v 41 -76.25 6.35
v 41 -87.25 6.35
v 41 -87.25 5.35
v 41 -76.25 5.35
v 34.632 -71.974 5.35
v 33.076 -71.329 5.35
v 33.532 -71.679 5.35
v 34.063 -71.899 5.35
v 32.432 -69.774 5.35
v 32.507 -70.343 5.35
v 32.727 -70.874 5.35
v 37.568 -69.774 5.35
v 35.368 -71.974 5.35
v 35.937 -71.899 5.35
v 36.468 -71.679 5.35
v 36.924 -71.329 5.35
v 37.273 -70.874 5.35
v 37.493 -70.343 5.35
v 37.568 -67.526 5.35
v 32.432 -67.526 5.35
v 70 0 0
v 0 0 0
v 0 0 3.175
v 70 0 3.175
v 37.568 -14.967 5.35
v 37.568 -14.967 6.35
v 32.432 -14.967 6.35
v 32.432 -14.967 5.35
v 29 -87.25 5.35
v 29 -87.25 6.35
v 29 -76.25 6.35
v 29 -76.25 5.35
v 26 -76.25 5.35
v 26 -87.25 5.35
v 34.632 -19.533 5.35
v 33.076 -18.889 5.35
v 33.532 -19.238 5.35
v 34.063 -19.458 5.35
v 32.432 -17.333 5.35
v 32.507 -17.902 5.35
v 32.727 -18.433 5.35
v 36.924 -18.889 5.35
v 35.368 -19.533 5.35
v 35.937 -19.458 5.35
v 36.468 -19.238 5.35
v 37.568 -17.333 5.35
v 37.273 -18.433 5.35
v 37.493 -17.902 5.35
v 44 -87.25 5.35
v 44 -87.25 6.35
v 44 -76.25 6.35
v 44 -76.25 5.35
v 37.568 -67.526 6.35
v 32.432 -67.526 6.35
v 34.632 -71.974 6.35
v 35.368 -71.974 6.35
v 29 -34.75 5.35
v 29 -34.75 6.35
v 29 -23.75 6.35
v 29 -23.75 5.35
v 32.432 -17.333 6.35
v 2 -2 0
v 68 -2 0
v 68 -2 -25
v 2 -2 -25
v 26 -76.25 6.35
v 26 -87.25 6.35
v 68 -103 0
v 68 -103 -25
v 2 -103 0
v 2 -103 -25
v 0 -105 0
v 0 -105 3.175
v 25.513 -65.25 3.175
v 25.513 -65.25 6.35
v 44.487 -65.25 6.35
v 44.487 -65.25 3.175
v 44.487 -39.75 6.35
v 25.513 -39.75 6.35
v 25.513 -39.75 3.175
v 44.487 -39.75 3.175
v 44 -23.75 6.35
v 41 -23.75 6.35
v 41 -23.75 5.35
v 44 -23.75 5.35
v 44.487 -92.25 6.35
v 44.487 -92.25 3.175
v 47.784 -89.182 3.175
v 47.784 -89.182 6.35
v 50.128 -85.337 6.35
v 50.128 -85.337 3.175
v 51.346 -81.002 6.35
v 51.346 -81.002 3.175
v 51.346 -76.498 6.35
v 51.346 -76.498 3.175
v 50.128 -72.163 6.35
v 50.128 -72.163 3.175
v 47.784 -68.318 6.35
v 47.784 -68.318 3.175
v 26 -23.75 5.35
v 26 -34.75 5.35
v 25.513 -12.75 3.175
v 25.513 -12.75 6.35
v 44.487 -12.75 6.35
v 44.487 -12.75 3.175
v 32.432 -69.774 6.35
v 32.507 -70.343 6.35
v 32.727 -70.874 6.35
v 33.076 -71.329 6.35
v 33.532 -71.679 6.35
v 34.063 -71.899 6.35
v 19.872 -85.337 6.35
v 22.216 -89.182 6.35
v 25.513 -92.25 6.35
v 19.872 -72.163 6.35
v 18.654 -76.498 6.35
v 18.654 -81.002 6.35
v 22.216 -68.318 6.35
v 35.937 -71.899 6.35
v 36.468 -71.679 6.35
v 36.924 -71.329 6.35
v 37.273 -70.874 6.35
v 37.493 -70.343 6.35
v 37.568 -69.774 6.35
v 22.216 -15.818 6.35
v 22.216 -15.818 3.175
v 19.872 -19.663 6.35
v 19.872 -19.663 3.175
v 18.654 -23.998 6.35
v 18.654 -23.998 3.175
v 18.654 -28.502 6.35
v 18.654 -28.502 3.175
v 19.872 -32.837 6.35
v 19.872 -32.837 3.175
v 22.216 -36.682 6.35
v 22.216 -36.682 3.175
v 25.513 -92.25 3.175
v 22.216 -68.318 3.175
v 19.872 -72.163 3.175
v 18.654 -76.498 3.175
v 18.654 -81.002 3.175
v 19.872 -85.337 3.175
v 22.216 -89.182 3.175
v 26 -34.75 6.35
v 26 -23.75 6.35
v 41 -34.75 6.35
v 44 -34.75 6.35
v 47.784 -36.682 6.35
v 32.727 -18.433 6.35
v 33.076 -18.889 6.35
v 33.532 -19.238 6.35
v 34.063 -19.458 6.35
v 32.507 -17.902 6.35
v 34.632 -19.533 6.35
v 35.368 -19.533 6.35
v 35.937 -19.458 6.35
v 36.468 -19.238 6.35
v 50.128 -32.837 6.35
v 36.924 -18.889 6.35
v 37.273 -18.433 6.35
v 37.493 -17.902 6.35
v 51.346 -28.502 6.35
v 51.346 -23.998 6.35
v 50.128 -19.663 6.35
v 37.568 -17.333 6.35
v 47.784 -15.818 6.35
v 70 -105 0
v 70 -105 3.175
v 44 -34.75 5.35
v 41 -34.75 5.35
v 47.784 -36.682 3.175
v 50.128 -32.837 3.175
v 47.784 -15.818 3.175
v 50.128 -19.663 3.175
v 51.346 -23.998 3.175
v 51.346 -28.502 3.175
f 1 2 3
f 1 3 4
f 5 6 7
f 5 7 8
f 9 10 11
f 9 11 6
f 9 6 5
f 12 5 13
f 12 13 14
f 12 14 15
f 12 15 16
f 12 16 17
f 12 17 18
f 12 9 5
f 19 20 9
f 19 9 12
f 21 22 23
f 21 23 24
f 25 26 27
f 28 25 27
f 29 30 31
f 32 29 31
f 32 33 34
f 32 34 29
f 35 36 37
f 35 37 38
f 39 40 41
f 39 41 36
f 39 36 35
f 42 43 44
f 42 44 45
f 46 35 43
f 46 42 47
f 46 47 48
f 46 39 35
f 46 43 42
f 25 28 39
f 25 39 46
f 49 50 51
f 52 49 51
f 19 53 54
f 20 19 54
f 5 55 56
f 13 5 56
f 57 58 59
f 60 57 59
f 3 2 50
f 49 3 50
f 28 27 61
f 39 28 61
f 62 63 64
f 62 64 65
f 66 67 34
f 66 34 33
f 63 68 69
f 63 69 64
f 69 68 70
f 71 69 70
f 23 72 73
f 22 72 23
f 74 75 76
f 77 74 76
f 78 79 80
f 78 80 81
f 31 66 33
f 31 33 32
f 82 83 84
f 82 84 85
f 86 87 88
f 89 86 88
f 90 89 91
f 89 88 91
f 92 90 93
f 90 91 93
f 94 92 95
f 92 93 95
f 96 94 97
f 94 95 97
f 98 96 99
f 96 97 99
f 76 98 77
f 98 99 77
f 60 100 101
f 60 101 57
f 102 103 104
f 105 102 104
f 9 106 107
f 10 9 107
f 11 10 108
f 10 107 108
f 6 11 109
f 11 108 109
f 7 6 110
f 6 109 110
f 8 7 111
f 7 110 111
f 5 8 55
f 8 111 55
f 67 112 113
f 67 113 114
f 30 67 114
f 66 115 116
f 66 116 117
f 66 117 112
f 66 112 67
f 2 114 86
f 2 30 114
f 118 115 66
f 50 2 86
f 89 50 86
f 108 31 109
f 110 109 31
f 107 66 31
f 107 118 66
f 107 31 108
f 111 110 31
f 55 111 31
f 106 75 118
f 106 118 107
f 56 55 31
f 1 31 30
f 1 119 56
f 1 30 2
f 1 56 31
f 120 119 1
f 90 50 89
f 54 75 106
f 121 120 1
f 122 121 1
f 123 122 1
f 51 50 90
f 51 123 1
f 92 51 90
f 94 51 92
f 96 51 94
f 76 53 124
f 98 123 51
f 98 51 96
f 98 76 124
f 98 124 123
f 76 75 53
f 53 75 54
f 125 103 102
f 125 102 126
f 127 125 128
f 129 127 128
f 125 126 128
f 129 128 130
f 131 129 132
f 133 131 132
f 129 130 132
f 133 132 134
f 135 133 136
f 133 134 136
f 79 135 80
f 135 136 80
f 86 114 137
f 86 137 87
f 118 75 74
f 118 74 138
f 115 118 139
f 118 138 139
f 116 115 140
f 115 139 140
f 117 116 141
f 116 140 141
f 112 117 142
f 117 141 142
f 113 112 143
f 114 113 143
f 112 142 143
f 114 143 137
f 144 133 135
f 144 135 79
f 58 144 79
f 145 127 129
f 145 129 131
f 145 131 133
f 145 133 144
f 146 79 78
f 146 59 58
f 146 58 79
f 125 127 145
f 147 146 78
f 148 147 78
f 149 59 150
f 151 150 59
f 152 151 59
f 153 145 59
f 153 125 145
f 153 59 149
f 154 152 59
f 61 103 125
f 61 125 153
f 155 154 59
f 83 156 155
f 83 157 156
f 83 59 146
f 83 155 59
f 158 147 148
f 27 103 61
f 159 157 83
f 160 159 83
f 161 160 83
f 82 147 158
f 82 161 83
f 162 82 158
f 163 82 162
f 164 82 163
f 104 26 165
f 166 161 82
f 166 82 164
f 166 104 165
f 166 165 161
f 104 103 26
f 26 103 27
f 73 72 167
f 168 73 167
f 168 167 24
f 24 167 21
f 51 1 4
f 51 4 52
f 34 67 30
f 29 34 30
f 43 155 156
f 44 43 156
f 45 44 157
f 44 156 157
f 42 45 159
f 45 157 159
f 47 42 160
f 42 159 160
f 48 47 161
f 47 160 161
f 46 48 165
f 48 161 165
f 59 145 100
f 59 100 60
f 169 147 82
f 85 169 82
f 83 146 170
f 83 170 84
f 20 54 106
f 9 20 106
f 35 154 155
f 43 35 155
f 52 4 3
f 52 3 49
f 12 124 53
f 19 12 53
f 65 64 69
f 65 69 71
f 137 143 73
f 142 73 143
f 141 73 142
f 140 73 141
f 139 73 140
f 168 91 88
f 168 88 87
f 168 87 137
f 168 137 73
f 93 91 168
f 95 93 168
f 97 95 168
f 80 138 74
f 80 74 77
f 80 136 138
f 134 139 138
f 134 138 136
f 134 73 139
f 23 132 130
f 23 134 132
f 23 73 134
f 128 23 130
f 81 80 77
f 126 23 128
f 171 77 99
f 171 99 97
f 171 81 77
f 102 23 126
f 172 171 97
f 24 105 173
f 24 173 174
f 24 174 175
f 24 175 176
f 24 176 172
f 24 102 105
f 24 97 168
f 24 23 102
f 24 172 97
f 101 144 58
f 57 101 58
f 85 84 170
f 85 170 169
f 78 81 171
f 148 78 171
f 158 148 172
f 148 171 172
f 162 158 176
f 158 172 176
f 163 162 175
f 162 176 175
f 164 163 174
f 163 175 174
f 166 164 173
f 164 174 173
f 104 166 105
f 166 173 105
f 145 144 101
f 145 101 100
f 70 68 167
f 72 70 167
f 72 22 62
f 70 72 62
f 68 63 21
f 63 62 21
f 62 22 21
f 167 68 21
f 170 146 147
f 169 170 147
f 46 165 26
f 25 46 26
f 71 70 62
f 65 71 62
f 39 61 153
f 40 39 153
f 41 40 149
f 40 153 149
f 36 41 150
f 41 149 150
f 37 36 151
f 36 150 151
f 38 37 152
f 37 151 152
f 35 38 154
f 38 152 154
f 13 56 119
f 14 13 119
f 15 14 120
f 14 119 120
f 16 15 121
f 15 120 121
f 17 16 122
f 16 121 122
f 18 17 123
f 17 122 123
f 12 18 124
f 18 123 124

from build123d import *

# Parameters (mm, degrees)
CROQUIS1_W              = 70
CROQUIS1_H              = 105
SALIENTE_EXTRUIR1_DEPTH = 3.175
CROQUIS2_R              = 16.5
SALIENTE_EXTRUIR2_DEPTH = 3.175
CROQUIS3_W              = 26
CROQUIS3_H              = 6
CORTAR_EXTRUIR1_DEPTH   = 3.175
CROQUIS4_W              = 3
CROQUIS4_H              = 11
CORTAR_EXTRUIR2_DEPTH   = 1
CROQUIS5_W              = 66
CROQUIS5_H              = 101
SALIENTE_EXTRUIR3_DEPTH = 25


with BuildPart() as part:
    # Croquis1 → Saliente-Extruir1 (new body)
    with BuildSketch(Plane.XY):
        with Locations((35, -52.5)):
            Rectangle(CROQUIS1_W, CROQUIS1_H)
    extrude(amount=SALIENTE_EXTRUIR1_DEPTH)

    # Croquis2 → Saliente-Extruir2 (add)
    with BuildSketch(Plane.XY.offset(3.175)):
        with Locations((35, -26.25)):
            Circle(CROQUIS2_R)
        with Locations((35, -78.75)):
            Circle(CROQUIS2_R)
    extrude(amount=SALIENTE_EXTRUIR2_DEPTH)

    # Croquis3 → Cortar-Extruir1 (cut)
    with BuildSketch(Plane.XY.offset(6.35)):
        with Locations((35, -9.75)):
            Rectangle(CROQUIS3_W, CROQUIS3_H)
        with Locations((35, -42.75)):
            Rectangle(CROQUIS3_W, CROQUIS3_H)
        with Locations((35, -62.25)):
            Rectangle(CROQUIS3_W, CROQUIS3_H)
        with Locations((35, -95.25)):
            Rectangle(CROQUIS3_W, CROQUIS3_H)
    extrude(amount=-CORTAR_EXTRUIR1_DEPTH, mode=Mode.SUBTRACT)

    # Croquis4 → Cortar-Extruir2 (cut)
    with BuildSketch(Plane.XY.offset(6.35)):
        with Locations((27.5, -29.25)):
            Rectangle(CROQUIS4_W, CROQUIS4_H)
        with Locations((42.5, -29.25)):
            Rectangle(CROQUIS4_W, CROQUIS4_H)
        with BuildLine():
            Line((34.632057675, -19.532945654), (35.367942325, -19.532945654))
            ThreePointArc((35.367942325, -19.532945654), (36.923577244, -18.888580572), (37.567942325, -17.332945654))
            Line((37.567942325, -17.332945654), (37.567942325, -14.967054346))
            Line((37.567942325, -14.967054346), (32.432057675, -14.967054346))
            Line((32.432057675, -14.967054346), (32.432057675, -17.332945654))
            ThreePointArc((32.432057675, -17.332945654), (33.076422756, -18.888580572), (34.632057675, -19.532945654))
        make_face()
        with Locations((42.5, -81.75)):
            Rectangle(CROQUIS4_W, CROQUIS4_H)
        with Locations((27.5, -81.75)):
            Rectangle(CROQUIS4_W, CROQUIS4_H)
        with BuildLine():
            Line((34.632057675, -71.973579429), (35.367942325, -71.973579429))
            ThreePointArc((35.367942325, -71.973579429), (36.923577244, -71.329214348), (37.567942325, -69.773579429))
            Line((37.567942325, -69.773579429), (37.567942325, -67.526420571))
            Line((37.567942325, -67.526420571), (32.432057675, -67.526420571))
            Line((32.432057675, -67.526420571), (32.432057675, -69.773579429))
            ThreePointArc((32.432057675, -69.773579429), (33.076422756, -71.329214348), (34.632057675, -71.973579429))
        make_face()
    extrude(amount=-CORTAR_EXTRUIR2_DEPTH, mode=Mode.SUBTRACT)

    # Croquis5 → Saliente-Extruir3 (add)
    with BuildSketch(Plane(origin=(0, 0, 0), x_dir=(-1, 0, 0), z_dir=(0, 0, -1))):
        with Locations((-35, -52.5)):
            Rectangle(CROQUIS5_W, CROQUIS5_H)
    extrude(amount=SALIENTE_EXTRUIR3_DEPTH)


solid = part.part
